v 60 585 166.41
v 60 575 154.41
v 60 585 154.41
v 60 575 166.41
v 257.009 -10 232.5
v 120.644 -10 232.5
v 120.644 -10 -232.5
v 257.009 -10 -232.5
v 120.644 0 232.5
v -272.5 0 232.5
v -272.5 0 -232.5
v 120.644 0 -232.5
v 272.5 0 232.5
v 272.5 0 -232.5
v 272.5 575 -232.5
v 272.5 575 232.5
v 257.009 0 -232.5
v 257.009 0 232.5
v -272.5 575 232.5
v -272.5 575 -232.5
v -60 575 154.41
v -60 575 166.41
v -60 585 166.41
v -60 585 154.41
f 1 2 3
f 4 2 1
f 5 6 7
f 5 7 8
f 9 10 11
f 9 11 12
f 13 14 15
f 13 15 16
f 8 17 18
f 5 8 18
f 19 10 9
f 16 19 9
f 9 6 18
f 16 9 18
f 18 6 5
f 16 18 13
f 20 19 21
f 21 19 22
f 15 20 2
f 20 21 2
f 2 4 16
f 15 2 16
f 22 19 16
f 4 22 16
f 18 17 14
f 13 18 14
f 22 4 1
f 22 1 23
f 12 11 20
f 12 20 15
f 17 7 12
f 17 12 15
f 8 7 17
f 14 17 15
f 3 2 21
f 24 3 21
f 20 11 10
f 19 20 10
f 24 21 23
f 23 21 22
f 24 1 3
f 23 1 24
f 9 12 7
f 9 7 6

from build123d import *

# Parameters (mm, degrees)
F0_W     = 545
F0_H     = 465
F1_DEPTH = 575
F2_W     = 120
F2_H     = 12
F3_DEPTH = 10
F4_W     = 136.365123
F4_H     = 465
F5_DEPTH = 10


with BuildPart() as f1:
    # F0 (on Front) → F1 (new body)
    with BuildSketch(Plane.XZ):
        Rectangle(F0_W, F0_H)
    extrude(amount=-F1_DEPTH)

    # F2 (on face) → F3 (join)
    with BuildSketch(Plane(origin=(0, 575, 0), x_dir=(-1, 0, 0), z_dir=(0, 1, 0))):
        with Locations((0, 160.409869)):
            Rectangle(F2_W, F2_H)
    extrude(amount=F3_DEPTH)

    # F4 (on face) → F5 (join)
    with BuildSketch(Plane.XZ):
        with Locations((188.826646, 0)):
            Rectangle(F4_W, F4_H)
    extrude(amount=F5_DEPTH)


solid = f1.part
